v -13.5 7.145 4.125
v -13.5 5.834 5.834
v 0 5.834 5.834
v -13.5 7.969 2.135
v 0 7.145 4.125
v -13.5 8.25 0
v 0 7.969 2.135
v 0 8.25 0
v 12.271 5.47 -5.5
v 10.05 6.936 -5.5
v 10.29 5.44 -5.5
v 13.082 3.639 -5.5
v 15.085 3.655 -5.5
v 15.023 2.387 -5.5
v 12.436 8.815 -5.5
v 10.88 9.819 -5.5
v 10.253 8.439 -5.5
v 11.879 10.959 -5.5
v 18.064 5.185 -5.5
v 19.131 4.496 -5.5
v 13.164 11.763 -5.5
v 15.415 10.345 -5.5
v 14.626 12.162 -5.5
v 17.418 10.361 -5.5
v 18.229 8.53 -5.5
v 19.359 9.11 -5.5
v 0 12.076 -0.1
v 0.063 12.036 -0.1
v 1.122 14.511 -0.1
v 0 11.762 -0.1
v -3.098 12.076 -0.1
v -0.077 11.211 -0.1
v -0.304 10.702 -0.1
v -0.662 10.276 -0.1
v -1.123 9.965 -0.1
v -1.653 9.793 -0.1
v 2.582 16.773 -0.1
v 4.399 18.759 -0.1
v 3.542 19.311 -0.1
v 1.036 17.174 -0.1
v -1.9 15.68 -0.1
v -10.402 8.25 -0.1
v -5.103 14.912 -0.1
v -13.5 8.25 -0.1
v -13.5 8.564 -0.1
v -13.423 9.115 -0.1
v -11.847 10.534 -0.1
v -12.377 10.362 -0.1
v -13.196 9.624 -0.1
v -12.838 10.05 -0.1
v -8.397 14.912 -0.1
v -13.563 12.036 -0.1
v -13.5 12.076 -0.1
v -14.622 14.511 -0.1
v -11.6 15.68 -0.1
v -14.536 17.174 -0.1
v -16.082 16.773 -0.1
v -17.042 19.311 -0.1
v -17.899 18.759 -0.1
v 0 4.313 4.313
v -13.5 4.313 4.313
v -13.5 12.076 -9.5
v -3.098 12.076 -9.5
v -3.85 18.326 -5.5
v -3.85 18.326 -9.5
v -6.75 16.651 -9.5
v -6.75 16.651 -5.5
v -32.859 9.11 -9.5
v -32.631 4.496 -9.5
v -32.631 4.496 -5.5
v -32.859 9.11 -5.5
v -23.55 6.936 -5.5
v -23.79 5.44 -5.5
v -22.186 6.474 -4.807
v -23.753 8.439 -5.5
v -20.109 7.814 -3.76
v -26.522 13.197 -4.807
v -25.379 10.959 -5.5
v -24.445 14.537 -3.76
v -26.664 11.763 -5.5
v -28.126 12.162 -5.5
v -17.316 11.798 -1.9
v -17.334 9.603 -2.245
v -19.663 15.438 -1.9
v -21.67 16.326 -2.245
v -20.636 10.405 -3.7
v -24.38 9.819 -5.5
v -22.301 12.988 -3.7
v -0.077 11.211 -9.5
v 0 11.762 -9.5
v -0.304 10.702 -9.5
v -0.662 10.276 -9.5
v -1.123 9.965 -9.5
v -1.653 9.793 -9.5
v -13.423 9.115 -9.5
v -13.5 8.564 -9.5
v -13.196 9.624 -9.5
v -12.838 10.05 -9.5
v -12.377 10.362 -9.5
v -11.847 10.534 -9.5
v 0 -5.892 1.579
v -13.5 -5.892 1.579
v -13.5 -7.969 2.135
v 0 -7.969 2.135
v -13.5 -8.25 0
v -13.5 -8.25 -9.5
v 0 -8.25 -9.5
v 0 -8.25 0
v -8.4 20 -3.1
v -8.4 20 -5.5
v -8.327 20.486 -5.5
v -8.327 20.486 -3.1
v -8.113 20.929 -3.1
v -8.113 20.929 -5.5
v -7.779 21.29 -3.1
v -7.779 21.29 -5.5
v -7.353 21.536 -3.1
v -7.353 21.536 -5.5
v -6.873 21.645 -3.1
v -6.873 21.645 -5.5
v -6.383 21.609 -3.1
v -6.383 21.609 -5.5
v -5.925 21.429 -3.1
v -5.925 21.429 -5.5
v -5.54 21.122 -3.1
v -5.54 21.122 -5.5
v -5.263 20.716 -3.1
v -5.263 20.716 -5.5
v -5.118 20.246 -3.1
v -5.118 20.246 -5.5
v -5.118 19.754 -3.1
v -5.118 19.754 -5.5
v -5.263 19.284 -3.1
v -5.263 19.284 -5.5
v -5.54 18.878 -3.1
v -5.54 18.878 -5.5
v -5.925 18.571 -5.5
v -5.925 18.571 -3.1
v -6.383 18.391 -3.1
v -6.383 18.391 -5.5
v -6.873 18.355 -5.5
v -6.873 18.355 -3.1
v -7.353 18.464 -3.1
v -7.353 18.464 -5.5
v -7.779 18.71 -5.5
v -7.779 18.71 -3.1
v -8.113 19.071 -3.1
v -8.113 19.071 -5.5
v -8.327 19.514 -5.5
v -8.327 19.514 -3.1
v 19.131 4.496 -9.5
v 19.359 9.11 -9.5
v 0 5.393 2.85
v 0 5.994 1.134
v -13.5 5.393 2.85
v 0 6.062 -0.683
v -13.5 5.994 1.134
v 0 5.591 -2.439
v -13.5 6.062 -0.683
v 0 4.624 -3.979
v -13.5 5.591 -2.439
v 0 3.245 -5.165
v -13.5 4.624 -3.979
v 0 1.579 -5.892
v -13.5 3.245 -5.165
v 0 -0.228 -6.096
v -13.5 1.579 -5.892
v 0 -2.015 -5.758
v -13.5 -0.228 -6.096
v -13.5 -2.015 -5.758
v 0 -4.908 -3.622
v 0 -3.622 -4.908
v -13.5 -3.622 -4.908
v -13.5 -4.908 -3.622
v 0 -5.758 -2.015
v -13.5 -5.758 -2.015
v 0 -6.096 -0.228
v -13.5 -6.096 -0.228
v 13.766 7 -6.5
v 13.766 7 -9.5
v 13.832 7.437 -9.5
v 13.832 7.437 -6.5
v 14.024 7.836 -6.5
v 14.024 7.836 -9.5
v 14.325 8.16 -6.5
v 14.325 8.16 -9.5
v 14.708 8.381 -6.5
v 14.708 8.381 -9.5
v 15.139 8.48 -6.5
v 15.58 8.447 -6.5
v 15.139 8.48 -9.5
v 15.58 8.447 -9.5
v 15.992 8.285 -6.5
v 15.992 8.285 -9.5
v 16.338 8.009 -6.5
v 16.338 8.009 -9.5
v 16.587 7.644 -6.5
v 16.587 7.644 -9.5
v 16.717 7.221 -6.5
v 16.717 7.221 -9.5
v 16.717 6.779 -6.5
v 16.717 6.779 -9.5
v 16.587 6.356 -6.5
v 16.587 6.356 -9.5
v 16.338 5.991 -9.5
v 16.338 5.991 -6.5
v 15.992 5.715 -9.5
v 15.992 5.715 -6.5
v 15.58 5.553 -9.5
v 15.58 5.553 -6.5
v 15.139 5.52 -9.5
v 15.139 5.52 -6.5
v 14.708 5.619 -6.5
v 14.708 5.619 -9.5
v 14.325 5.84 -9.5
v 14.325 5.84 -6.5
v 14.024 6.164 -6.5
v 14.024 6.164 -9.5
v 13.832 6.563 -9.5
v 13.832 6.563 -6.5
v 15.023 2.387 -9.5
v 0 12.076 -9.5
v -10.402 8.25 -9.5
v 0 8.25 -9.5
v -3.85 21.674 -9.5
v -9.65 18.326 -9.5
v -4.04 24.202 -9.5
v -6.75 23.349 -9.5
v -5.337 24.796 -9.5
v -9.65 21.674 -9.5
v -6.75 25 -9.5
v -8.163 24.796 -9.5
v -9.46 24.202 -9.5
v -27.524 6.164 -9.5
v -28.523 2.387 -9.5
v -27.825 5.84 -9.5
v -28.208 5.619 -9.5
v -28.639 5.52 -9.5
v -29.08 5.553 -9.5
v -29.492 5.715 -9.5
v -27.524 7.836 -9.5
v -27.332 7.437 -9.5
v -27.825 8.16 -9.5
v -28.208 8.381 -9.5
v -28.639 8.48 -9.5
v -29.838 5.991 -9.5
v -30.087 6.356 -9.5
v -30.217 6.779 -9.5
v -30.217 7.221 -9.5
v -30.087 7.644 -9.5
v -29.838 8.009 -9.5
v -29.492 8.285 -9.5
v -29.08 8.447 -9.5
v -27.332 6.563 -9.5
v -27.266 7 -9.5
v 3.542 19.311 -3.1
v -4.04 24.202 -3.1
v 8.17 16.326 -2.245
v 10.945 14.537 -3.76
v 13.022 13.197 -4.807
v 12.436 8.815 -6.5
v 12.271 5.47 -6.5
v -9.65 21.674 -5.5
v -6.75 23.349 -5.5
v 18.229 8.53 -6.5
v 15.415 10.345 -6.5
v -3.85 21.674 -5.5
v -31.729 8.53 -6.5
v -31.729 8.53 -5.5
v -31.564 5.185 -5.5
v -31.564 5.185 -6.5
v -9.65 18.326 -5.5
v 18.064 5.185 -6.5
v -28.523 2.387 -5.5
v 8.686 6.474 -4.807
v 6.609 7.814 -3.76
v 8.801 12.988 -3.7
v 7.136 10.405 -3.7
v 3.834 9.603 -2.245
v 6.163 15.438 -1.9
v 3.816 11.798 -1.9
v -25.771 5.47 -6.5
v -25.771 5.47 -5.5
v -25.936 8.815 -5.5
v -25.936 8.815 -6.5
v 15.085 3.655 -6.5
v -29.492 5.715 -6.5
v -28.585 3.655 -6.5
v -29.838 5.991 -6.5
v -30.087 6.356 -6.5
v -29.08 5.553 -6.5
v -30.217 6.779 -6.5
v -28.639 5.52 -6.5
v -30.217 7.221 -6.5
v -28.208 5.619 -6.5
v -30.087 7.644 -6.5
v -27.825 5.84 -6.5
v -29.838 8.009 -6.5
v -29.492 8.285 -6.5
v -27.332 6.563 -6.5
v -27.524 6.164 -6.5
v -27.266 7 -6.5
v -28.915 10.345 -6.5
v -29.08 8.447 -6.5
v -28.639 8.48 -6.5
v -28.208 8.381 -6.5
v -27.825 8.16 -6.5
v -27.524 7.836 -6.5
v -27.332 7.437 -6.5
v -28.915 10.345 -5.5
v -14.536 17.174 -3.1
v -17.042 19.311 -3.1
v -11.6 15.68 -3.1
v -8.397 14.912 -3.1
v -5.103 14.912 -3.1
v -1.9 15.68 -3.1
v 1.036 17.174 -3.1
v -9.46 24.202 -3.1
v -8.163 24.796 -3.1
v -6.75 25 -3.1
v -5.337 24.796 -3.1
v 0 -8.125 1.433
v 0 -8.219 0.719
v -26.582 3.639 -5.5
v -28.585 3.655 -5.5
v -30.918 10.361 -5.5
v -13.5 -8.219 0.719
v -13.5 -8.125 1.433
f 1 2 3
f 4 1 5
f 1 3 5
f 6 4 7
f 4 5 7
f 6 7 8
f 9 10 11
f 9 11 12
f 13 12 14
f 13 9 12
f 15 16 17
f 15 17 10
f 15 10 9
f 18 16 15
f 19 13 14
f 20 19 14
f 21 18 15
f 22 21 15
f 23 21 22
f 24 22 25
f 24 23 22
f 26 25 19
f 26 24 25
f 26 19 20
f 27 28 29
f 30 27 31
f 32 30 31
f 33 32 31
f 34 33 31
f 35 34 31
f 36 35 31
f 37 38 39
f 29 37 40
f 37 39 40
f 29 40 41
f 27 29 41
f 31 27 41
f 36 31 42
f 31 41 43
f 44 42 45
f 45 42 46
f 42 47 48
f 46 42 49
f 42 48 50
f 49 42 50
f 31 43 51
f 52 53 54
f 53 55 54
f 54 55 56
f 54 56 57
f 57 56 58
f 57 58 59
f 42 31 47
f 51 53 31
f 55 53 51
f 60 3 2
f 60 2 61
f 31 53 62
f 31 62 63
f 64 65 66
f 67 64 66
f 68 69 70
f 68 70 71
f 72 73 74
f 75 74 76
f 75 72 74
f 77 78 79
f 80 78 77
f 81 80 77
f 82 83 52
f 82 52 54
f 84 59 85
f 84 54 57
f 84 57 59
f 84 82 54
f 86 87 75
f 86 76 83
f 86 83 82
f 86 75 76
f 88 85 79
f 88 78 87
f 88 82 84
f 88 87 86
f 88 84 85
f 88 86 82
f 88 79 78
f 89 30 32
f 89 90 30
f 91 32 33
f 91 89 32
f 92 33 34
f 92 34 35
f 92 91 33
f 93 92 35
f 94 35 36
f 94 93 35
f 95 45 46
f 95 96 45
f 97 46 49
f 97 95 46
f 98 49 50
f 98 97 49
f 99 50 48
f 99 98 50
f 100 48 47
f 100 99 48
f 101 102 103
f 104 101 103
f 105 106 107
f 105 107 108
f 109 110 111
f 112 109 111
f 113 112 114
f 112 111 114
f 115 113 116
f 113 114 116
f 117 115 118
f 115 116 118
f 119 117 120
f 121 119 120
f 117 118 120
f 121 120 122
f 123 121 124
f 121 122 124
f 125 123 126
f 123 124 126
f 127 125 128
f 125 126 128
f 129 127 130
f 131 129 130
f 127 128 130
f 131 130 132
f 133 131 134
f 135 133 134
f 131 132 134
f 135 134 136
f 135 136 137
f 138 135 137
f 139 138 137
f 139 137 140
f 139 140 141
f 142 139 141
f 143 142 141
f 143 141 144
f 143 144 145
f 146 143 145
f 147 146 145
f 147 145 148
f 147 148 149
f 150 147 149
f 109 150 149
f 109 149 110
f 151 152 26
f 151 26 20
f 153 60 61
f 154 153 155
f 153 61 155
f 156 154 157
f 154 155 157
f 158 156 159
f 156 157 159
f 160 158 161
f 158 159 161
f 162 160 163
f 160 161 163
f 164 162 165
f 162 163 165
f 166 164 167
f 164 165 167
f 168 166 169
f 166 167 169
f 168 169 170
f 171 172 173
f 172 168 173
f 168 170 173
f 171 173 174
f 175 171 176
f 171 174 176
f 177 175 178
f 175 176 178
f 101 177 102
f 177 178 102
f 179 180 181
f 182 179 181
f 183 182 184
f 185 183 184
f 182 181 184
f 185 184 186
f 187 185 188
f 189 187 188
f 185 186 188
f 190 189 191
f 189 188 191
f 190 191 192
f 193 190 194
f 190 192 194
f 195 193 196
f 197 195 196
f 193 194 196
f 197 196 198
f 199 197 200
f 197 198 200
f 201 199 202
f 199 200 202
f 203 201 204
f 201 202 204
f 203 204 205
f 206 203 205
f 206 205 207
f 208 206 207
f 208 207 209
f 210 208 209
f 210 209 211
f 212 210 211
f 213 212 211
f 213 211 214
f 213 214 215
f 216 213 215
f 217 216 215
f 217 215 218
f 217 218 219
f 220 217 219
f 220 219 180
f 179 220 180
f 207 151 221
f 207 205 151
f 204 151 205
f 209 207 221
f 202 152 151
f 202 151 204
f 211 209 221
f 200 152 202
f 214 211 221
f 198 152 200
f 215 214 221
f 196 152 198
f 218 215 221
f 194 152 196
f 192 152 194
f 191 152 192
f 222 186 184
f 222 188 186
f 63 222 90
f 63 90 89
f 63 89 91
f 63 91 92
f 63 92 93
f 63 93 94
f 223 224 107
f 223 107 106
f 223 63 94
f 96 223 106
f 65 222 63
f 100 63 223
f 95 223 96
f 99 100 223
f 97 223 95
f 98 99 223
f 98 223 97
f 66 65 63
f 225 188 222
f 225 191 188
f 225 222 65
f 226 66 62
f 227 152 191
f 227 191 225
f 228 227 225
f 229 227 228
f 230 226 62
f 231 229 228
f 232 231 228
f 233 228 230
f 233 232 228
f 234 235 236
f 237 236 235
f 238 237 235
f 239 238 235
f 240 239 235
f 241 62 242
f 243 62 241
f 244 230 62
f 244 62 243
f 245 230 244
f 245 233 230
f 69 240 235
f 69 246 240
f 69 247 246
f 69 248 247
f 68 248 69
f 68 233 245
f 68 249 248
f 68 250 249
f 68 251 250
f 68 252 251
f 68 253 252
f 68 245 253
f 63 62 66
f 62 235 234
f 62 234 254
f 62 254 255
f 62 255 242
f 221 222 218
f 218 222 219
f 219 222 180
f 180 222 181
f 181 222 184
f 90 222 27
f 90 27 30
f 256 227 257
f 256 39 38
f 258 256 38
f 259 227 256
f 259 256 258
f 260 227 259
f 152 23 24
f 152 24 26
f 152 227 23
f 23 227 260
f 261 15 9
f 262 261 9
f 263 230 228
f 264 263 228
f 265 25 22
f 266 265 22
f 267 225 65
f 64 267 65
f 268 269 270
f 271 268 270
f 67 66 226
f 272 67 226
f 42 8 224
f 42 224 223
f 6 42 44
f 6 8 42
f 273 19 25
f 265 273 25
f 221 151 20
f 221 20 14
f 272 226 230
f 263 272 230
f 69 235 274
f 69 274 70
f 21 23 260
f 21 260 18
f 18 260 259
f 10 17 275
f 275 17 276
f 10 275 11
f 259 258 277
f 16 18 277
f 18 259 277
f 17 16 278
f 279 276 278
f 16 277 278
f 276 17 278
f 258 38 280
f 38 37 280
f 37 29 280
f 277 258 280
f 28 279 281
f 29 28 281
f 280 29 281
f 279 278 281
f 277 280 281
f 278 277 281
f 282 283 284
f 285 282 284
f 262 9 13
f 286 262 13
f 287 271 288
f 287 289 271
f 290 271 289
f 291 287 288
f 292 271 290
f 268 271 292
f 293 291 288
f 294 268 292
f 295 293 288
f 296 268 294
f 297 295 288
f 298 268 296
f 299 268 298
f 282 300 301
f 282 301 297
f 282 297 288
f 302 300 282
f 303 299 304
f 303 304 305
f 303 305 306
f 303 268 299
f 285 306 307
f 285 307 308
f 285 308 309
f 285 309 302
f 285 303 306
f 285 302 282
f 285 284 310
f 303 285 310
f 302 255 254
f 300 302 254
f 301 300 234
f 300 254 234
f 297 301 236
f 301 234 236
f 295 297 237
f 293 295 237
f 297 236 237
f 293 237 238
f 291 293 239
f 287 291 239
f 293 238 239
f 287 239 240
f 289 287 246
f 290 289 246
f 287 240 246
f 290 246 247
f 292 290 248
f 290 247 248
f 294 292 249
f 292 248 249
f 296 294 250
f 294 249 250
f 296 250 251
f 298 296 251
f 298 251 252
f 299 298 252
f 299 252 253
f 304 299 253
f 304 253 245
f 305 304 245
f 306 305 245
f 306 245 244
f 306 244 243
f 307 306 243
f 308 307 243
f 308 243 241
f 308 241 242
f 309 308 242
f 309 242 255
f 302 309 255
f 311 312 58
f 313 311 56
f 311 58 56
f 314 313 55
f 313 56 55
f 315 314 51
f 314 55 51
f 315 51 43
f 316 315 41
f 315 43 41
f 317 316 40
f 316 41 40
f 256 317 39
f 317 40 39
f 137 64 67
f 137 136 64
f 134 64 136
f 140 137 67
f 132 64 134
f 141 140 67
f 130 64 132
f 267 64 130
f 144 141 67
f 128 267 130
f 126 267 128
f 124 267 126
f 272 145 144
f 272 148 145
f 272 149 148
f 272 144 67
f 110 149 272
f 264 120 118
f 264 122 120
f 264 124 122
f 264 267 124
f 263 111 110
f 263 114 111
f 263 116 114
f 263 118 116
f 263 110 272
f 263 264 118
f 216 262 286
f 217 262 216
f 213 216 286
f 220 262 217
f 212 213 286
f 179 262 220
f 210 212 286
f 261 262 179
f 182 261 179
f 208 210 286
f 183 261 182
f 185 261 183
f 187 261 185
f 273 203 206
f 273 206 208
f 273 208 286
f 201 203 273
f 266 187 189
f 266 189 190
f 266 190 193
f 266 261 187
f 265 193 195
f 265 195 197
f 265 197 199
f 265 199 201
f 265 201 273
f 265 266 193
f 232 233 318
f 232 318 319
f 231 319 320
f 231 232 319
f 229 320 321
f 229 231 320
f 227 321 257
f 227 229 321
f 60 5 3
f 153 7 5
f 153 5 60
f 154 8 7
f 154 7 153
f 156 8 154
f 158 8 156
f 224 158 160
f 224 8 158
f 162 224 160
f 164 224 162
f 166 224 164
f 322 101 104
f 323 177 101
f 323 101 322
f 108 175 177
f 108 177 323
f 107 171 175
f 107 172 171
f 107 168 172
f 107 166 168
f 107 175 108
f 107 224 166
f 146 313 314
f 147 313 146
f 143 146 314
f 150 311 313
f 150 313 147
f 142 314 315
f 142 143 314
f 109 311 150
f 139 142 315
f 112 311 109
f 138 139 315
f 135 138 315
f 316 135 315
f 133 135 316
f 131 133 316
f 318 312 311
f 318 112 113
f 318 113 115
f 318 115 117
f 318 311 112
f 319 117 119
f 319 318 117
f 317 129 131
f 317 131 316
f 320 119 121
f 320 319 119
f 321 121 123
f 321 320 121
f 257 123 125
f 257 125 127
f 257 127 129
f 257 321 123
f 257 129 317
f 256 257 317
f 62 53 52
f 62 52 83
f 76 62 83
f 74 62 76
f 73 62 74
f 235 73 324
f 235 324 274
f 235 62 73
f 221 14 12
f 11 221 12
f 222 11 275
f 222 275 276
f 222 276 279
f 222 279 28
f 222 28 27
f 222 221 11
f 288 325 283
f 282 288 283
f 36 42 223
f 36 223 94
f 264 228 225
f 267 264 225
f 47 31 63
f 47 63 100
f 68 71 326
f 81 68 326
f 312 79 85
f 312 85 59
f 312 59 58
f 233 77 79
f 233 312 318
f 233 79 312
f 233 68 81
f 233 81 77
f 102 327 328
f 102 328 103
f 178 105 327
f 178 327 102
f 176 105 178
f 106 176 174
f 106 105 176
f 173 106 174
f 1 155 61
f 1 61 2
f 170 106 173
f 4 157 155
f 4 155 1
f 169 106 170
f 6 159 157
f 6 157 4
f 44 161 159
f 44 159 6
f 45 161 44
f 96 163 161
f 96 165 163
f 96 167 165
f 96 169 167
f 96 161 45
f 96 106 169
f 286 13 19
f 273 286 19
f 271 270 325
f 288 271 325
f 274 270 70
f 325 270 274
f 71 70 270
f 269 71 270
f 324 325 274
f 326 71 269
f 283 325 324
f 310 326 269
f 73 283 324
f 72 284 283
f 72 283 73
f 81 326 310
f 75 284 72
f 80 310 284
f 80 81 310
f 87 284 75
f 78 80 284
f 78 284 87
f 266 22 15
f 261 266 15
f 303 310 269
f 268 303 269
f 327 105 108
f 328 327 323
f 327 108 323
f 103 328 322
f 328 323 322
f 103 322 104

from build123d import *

# Parameters (mm, degrees)
BOSS_EXTRUDE1_DEPTH = 13.5
CUT_EXTRUDE1_DEPTH  = 19.454335534
SKETCH14_R          = 1.65
SKETCH14_R_2        = 1.483994527
BOSS_EXTRUDE3_DEPTH = 9.4
CUT_EXTRUDE7_DEPTH  = 43.344584395
FILLET2_R           = 2
CUT_EXTRUDE8_DEPTH  = 4
CUT_EXTRUDE9_DEPTH  = 5.4
CHAMFER2_SIZE       = 12
CHAMFER2_SIZE_2     = 6
CHAMFER3_SIZE       = 6
CHAMFER3_SIZE_2     = 12
SKETCH18_R          = 14.026707194
CUT_EXTRUDE10_DEPTH = 3
CUT_EXTRUDE11_DEPTH = 1


with BuildPart() as part:
    # Sketch1 → Boss-Extrude1 (new body)
    with BuildSketch(Plane.ZY):
        with BuildLine():
            Line((-9.5, 8.25), (-9.5, -8.25))
            Line((-9.5, -8.25), (0, -8.25))
            ThreePointArc((0, -8.25), (8.25, 0), (0, 8.25))
            Line((0, 8.25), (-9.5, 8.25))
        make_face()
    extrude(amount=BOSS_EXTRUDE1_DEPTH)

    # Sketch7 → Cut-Extrude1 (cut, through all)
    with BuildSketch(Plane.ZY.offset(13.5)):
        with BuildLine():
            Line((13.481907846, 13.481907846), (4.313351365, 4.313351365))
            ThreePointArc((4.313351365, 4.313351365), (-5.89214754, 1.578796175), (1.578796175, -5.89214754))
            Line((1.578796175, -5.89214754), (4.934720763, -18.416628609))
            Line((4.934720763, -18.416628609), (13.481907846, 13.481907846))
        make_face()
    extrude(amount=-CUT_EXTRUDE1_DEPTH, mode=Mode.SUBTRACT)

    # Sketch14 → Boss-Extrude3 (add)
    with BuildSketch(Plane(origin=(0, 0, -9.5), x_dir=(-1, 0, 0), z_dir=(0, 0, -1))):
        with BuildLine():
            Line((4.039848555, 24.201794753), (-19.358847021, 9.109670469))
            Line((-19.358847021, 9.109670469), (-19.131451731, 4.496469334))
            Line((-19.131451731, 4.496469334), (-15.022604709, 2.386798865))
            Line((-15.022604709, 2.386798865), (0, 12.07635684))
            Line((0, 12.07635684), (0, 8.25))
            Line((0, 8.25), (13.5, 8.25))
            Line((13.5, 8.25), (13.5, 12.07635684))
            Line((13.5, 12.07635684), (28.522604709, 2.386798865))
            Line((28.522604709, 2.386798865), (32.631451731, 4.496469334))
            Line((32.631451731, 4.496469334), (32.858847021, 9.109670469))
            Line((32.858847021, 9.109670469), (9.460151445, 24.201794753))
            ThreePointArc((9.460151445, 24.201794753), (6.75, 25), (4.039848555, 24.201794753))
        make_face()
        with Locations((6.75, 20)):
            Circle(SKETCH14_R, mode=Mode.SUBTRACT)
        with Locations((-15.25, 7)):
            Circle(SKETCH14_R_2, mode=Mode.SUBTRACT)
        with Locations(Location((28.75, 7, 0), (0, 0, 180))):
            Circle(SKETCH14_R_2, mode=Mode.SUBTRACT)
    extrude(amount=-BOSS_EXTRUDE3_DEPTH)

    # Sketch15 → Cut-Extrude7 (cut, through all)
    with BuildSketch(Plane.XY.offset(-0.1)):
        Polygon((0, 8.25), (-10.401710887, 8.25), (0, 10.084102275), align=None)
        Polygon((-13.5, 10.242254565), (-13.5, 12.07635684), (-3.098289113, 12.07635684), align=None)
    extrude(amount=-CUT_EXTRUDE7_DEPTH, mode=Mode.SUBTRACT)

    # Fillet2
    fillet2_edges = [part.edges().sort_by_distance(p)[0] for p in [
        (0, 10.084102275, -4.8),
        (-13.5, 10.242254565, -4.8),
    ]]
    fillet(fillet2_edges, radius=FILLET2_R)

    # Sketch16 → Cut-Extrude8 (cut)
    with BuildSketch(Plane(origin=(0, 0, -9.5), x_dir=(-1, 0, 0), z_dir=(0, 0, -1))):
        Polygon((6.75, 16.651368439), (9.65, 18.325684219), (9.65, 21.674315781), (6.75, 23.348631561), (3.85, 21.674315781), (3.85, 18.325684219), align=None)
    extrude(amount=-CUT_EXTRUDE8_DEPTH, mode=Mode.SUBTRACT)

    # Sketch17 → Cut-Extrude9 (cut)
    with BuildSketch(Plane.XY.offset(-0.1)):
        with BuildLine():
            Line((19.131451731, 4.496469334), (19.358847021, 9.109670469))
            Line((19.358847021, 9.109670469), (17.418121156, 10.361435802))
            ThreePointArc((17.418121156, 10.361435802), (11.888564198, 9.168121156), (13.081878844, 3.638564198))
            Line((13.081878844, 3.638564198), (15.022604709, 2.386798865))
            Line((15.022604709, 2.386798865), (19.131451731, 4.496469334))
        make_face()
        with BuildLine():
            Line((-32.631451731, 4.496469334), (-28.522604709, 2.386798865))
            Line((-28.522604709, 2.386798865), (-26.581878844, 3.638564198))
            ThreePointArc((-26.581878844, 3.638564198), (-25.388564198, 9.168121156), (-30.918121156, 10.361435802))
            Line((-30.918121156, 10.361435802), (-32.858847021, 9.109670469))
            Line((-32.858847021, 9.109670469), (-32.631451731, 4.496469334))
        make_face()
    extrude(amount=-CUT_EXTRUDE9_DEPTH, mode=Mode.SUBTRACT)

    # Chamfer2
    # the kernel refuses this chamfer: 12, 6 mm, written as the material it takes off along each edge
    with BuildSketch(Plane(origin=(-28.75, 7, -0.1), x_dir=(-0.8386519680093931, -0.5446676753342096, 0), z_dir=(-0.5446676753342096, 0.8386519680093931, 0))) as chamfer2_piece_1_section:
        Polygon((4 + CHAMFER2_SIZE, 0), (4, -CHAMFER2_SIZE_2), (4, 0), align=None)
    chamfer2_piece_1 = revolve(axis=Axis((-28.75, 7, -0.1), (0, 0, 1)), revolution_arc=359.64, mode=Mode.PRIVATE)
    chamfer2_piece_1 = split(chamfer2_piece_1, bisect_by=Plane(origin=(-24.520519127, 4.968138188, -1.544016366), z_dir=(-0.5420302889814643, 0.8403589505840171, 0)), keep=Keep.TOP, mode=Mode.PRIVATE)
    chamfer2_piece_1 = split(chamfer2_piece_1, bisect_by=Plane(origin=(-24.679235885, 5.214211241, -5.5), z_dir=(0, 0, 1)), keep=Keep.TOP, mode=Mode.PRIVATE)
    add(chamfer2_piece_1, mode=Mode.SUBTRACT)

    # Chamfer3
    # the kernel refuses this chamfer: 12, 6 mm, written as the material it takes off along each edge
    with BuildSketch(Plane(origin=(15.25, 7, -0.1), x_dir=(0.8420576391550663, -0.5393875530085916, 0), z_dir=(-0.5393875530085916, -0.8420576391550663, 0))) as chamfer3_piece_1_section:
        Polygon((4, -CHAMFER3_SIZE), (4 + CHAMFER3_SIZE_2, 0), (4, 0), align=None)
    chamfer3_piece_1 = revolve(axis=Axis((15.25, 7, -0.1), (0, 0, 1)), revolution_arc=359.64, mode=Mode.PRIVATE)
    chamfer3_piece_1 = split(chamfer3_piece_1, bisect_by=Plane(origin=(8.890128565, 11.795128101, -5.5), z_dir=(0, 0, 1)), keep=Keep.TOP, mode=Mode.PRIVATE)
    chamfer3_piece_1 = split(chamfer3_piece_1, bisect_by=Plane(origin=(0, 11.795128101, -1.99911645), z_dir=(1, 0, 0)), keep=Keep.TOP, mode=Mode.PRIVATE)
    add(chamfer3_piece_1, mode=Mode.SUBTRACT)

    # Sketch18 → Cut-Extrude10 (cut)
    with BuildSketch(Plane.XY.offset(-0.1)):
        with Locations((-6.75, 28.841468874)):
            Circle(SKETCH18_R)
    extrude(amount=-CUT_EXTRUDE10_DEPTH, mode=Mode.SUBTRACT)

    # Sketch19 → Cut-Extrude11 (cut)
    with BuildSketch(Plane.XY.offset(-5.5)):
        Polygon((-31.564052505, 5.184940267), (-28.585138414, 3.655429177), (-25.77108591, 5.47048891), (-25.935947495, 8.815059733), (-28.914861586, 10.344570823), (-31.72891409, 8.52951109), align=None)
        Polygon((18.064052505, 5.184940267), (18.22891409, 8.52951109), (15.414861586, 10.344570823), (12.435947495, 8.815059733), (12.27108591, 5.47048891), (15.085138414, 3.655429177), align=None)
    extrude(amount=-CUT_EXTRUDE11_DEPTH, mode=Mode.SUBTRACT)


solid = part.part
